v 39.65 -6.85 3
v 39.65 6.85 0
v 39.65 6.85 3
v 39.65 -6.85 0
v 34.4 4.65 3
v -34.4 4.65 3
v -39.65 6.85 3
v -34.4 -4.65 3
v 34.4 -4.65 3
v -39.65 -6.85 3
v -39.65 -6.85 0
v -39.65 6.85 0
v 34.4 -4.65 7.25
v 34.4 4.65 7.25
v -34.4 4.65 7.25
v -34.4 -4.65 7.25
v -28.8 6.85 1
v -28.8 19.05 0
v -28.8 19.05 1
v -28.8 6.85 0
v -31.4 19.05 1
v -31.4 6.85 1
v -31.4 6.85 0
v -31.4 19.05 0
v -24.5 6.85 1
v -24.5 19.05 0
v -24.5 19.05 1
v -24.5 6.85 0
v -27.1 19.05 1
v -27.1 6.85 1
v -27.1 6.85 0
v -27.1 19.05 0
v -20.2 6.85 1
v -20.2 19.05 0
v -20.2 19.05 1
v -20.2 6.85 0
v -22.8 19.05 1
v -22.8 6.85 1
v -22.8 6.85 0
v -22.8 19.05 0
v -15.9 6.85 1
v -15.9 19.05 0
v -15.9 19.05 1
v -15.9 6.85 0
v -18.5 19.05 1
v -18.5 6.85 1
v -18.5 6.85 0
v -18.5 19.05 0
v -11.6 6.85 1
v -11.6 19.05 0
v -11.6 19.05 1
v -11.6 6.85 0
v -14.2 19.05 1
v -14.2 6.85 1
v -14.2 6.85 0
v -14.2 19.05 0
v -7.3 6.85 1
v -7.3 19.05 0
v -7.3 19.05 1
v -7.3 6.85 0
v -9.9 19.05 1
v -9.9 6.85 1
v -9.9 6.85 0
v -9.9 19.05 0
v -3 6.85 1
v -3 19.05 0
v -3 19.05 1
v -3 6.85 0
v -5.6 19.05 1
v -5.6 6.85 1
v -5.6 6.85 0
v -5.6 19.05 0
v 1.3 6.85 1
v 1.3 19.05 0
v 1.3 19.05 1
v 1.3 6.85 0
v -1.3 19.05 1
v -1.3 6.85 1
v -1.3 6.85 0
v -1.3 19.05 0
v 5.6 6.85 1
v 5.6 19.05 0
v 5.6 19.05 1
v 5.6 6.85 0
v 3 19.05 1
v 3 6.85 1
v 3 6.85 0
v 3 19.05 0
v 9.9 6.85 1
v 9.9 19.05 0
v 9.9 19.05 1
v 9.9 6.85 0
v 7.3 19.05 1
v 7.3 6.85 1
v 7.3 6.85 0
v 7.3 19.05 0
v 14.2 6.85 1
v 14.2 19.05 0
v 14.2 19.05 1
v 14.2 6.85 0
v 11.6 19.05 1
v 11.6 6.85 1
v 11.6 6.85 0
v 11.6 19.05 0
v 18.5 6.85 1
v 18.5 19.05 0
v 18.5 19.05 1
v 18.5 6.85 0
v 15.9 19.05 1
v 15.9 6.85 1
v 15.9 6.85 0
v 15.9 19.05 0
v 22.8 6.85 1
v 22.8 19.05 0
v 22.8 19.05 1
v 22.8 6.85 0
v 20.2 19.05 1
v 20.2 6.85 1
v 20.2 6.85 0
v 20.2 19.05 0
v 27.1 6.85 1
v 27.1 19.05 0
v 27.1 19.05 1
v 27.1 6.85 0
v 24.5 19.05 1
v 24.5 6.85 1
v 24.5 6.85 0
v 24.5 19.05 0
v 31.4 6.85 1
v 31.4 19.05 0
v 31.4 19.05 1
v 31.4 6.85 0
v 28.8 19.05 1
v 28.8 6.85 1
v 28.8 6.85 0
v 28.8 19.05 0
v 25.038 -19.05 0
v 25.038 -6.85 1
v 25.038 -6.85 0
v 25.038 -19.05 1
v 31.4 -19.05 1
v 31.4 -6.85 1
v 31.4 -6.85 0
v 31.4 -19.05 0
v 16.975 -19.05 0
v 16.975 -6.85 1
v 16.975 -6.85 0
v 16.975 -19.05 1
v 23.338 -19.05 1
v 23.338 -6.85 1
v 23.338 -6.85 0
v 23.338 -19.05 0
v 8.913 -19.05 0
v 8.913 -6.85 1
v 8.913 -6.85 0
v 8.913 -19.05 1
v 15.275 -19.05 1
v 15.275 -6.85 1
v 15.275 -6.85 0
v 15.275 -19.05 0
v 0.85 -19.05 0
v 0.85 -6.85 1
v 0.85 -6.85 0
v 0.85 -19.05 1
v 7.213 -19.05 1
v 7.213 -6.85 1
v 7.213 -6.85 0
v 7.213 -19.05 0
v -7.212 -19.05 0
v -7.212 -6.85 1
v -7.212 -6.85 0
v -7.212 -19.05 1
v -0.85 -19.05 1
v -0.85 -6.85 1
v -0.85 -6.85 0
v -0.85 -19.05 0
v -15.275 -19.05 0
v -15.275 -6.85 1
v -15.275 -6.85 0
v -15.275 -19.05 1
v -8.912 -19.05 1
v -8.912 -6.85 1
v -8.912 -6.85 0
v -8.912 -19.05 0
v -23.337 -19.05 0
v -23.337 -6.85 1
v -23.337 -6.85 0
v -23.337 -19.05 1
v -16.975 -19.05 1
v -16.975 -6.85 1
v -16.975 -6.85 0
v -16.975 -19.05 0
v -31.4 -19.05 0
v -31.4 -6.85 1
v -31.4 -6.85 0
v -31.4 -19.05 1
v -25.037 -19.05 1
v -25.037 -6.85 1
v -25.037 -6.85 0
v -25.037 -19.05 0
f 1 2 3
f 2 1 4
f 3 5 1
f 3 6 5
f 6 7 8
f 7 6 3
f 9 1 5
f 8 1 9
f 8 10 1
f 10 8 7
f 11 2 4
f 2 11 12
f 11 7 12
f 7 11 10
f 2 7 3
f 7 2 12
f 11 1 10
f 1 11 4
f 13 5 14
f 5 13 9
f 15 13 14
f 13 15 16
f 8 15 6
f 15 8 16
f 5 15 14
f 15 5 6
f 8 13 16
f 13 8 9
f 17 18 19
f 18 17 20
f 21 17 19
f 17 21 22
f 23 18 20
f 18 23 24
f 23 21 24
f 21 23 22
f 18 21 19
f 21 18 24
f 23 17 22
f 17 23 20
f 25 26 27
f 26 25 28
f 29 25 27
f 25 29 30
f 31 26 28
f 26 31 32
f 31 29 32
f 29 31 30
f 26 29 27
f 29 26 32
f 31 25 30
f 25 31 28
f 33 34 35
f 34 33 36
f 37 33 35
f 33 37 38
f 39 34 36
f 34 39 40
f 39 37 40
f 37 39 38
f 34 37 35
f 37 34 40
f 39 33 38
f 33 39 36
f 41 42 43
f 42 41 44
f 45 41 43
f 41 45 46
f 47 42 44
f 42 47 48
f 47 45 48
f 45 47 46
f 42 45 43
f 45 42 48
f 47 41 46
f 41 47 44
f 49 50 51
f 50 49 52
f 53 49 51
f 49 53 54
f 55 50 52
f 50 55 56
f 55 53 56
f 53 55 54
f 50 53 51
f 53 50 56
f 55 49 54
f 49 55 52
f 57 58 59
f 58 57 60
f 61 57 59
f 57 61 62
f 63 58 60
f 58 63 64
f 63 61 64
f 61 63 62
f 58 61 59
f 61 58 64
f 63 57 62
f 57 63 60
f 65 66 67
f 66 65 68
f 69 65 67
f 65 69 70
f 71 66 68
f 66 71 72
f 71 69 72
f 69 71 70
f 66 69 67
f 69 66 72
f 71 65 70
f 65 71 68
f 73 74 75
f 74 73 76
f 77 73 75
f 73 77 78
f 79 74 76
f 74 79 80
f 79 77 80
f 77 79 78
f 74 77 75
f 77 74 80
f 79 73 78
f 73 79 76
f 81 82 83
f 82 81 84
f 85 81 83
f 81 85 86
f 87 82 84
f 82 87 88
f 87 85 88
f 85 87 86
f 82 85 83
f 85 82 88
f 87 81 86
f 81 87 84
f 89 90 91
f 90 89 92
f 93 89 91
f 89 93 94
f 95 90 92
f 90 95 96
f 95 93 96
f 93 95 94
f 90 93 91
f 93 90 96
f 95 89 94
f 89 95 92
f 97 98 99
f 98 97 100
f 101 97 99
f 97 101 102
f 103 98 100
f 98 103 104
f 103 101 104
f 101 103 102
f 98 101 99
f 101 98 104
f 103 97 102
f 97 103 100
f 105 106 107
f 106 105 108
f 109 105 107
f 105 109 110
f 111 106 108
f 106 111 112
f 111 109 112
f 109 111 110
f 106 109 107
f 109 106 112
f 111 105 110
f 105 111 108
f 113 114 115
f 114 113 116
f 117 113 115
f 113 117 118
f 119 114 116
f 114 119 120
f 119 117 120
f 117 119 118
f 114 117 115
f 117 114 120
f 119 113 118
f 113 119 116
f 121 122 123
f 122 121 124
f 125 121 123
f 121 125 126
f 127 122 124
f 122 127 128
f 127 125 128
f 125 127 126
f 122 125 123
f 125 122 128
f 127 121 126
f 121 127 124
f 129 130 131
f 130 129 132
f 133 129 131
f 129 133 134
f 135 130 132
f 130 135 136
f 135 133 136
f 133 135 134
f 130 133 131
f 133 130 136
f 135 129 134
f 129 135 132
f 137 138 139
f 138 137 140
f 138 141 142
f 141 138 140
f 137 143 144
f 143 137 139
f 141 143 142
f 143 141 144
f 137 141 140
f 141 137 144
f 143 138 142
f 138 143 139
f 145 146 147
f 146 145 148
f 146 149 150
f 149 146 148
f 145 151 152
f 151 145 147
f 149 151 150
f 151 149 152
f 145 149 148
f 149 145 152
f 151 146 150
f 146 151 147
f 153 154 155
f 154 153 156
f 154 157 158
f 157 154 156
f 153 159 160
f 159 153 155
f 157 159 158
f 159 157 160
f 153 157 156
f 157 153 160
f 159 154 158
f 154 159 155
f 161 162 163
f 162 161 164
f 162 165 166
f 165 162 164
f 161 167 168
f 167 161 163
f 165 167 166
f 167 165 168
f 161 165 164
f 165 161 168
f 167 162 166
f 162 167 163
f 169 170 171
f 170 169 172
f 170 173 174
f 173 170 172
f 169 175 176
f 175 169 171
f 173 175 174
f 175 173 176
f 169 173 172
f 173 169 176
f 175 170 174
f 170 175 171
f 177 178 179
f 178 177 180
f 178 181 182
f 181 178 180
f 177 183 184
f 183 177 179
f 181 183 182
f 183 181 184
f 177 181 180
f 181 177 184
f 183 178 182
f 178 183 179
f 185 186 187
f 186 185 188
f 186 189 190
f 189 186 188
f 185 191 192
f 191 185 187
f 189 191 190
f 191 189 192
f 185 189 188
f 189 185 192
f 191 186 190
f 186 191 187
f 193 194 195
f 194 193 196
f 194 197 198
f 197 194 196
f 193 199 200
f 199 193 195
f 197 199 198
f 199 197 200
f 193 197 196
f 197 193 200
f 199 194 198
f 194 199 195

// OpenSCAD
/* [Teeth] */

// Width reserved on either end of comb to be free of teeth.
tooth_margin = 8.25;

// Spacing between teeth.
front_tooth_gap = 1.7;
rear_tooth_gap = 1.7;

// Number of teeth. Tooth width is calculated from tooth count, gap, and available space.
front_tooth_count = 8;
rear_tooth_count = 15;

// Length of teeth, measured perpendicular from comb.
tooth_length = 12.2;

// Thickness of teeth.
front_tooth_height = 1.0;
rear_tooth_height = 1.0;

/* [Core] */

// Width of lower section of comb core.
comb_x = 79.3;

// Length (narrow dimension) or lower section of comb core, not counting teeth.
comb_y = 13.7;

// Height of lower section of comb core (from base).
comb_z = 3.0;

// Width of raised section of comb core (centered in lower section).
raised_x = 68.8;

// Length (narrow dimension) of raised section of comb core (centered in lower section).
raised_y = 9.3;

// Height of raised section of comb core (from base).
raised_z = 7.25;

/* [Hidden] */

// Width available for teeth (comb width minus margins).
tooth_span = comb_x - (2 * tooth_margin);

// Individual tooth width (maximum to fill span with count teeth with gap betwen each).
front_tooth_width = (tooth_span - (front_tooth_count - 1) * front_tooth_gap) / front_tooth_count;
rear_tooth_width = (tooth_span - (rear_tooth_count - 1) * rear_tooth_gap) / rear_tooth_count;

echo(front_tooth_width);
echo(rear_tooth_width);

union() {
	Core();
	Teeth(rear_tooth_count, rear_tooth_width, rear_tooth_gap, rear_tooth_height);
	rotate([0, 0, 180]) Teeth(front_tooth_count, front_tooth_width, front_tooth_gap, front_tooth_height);
}

module Core() {
	union() {
		translate([0, 0, comb_z/2]) cube([comb_x, comb_y, comb_z], center=true);
		translate([0, 0, raised_z/2]) cube([raised_x, raised_y, raised_z], center=true);
	}
}

module Teeth(count, width, gap, height) {
	translate([-tooth_span/2 + width/2, comb_y/2, 0]) union() {
		for(i = [0:count-1]) {
			translate([i * (width + gap), 0, 0]) Tooth(width, tooth_length, height);
		}
	}
}

module Tooth(width, length, height) {
	translate([0, length/2, height/2]) cube([width, length, height], center=true);
}
